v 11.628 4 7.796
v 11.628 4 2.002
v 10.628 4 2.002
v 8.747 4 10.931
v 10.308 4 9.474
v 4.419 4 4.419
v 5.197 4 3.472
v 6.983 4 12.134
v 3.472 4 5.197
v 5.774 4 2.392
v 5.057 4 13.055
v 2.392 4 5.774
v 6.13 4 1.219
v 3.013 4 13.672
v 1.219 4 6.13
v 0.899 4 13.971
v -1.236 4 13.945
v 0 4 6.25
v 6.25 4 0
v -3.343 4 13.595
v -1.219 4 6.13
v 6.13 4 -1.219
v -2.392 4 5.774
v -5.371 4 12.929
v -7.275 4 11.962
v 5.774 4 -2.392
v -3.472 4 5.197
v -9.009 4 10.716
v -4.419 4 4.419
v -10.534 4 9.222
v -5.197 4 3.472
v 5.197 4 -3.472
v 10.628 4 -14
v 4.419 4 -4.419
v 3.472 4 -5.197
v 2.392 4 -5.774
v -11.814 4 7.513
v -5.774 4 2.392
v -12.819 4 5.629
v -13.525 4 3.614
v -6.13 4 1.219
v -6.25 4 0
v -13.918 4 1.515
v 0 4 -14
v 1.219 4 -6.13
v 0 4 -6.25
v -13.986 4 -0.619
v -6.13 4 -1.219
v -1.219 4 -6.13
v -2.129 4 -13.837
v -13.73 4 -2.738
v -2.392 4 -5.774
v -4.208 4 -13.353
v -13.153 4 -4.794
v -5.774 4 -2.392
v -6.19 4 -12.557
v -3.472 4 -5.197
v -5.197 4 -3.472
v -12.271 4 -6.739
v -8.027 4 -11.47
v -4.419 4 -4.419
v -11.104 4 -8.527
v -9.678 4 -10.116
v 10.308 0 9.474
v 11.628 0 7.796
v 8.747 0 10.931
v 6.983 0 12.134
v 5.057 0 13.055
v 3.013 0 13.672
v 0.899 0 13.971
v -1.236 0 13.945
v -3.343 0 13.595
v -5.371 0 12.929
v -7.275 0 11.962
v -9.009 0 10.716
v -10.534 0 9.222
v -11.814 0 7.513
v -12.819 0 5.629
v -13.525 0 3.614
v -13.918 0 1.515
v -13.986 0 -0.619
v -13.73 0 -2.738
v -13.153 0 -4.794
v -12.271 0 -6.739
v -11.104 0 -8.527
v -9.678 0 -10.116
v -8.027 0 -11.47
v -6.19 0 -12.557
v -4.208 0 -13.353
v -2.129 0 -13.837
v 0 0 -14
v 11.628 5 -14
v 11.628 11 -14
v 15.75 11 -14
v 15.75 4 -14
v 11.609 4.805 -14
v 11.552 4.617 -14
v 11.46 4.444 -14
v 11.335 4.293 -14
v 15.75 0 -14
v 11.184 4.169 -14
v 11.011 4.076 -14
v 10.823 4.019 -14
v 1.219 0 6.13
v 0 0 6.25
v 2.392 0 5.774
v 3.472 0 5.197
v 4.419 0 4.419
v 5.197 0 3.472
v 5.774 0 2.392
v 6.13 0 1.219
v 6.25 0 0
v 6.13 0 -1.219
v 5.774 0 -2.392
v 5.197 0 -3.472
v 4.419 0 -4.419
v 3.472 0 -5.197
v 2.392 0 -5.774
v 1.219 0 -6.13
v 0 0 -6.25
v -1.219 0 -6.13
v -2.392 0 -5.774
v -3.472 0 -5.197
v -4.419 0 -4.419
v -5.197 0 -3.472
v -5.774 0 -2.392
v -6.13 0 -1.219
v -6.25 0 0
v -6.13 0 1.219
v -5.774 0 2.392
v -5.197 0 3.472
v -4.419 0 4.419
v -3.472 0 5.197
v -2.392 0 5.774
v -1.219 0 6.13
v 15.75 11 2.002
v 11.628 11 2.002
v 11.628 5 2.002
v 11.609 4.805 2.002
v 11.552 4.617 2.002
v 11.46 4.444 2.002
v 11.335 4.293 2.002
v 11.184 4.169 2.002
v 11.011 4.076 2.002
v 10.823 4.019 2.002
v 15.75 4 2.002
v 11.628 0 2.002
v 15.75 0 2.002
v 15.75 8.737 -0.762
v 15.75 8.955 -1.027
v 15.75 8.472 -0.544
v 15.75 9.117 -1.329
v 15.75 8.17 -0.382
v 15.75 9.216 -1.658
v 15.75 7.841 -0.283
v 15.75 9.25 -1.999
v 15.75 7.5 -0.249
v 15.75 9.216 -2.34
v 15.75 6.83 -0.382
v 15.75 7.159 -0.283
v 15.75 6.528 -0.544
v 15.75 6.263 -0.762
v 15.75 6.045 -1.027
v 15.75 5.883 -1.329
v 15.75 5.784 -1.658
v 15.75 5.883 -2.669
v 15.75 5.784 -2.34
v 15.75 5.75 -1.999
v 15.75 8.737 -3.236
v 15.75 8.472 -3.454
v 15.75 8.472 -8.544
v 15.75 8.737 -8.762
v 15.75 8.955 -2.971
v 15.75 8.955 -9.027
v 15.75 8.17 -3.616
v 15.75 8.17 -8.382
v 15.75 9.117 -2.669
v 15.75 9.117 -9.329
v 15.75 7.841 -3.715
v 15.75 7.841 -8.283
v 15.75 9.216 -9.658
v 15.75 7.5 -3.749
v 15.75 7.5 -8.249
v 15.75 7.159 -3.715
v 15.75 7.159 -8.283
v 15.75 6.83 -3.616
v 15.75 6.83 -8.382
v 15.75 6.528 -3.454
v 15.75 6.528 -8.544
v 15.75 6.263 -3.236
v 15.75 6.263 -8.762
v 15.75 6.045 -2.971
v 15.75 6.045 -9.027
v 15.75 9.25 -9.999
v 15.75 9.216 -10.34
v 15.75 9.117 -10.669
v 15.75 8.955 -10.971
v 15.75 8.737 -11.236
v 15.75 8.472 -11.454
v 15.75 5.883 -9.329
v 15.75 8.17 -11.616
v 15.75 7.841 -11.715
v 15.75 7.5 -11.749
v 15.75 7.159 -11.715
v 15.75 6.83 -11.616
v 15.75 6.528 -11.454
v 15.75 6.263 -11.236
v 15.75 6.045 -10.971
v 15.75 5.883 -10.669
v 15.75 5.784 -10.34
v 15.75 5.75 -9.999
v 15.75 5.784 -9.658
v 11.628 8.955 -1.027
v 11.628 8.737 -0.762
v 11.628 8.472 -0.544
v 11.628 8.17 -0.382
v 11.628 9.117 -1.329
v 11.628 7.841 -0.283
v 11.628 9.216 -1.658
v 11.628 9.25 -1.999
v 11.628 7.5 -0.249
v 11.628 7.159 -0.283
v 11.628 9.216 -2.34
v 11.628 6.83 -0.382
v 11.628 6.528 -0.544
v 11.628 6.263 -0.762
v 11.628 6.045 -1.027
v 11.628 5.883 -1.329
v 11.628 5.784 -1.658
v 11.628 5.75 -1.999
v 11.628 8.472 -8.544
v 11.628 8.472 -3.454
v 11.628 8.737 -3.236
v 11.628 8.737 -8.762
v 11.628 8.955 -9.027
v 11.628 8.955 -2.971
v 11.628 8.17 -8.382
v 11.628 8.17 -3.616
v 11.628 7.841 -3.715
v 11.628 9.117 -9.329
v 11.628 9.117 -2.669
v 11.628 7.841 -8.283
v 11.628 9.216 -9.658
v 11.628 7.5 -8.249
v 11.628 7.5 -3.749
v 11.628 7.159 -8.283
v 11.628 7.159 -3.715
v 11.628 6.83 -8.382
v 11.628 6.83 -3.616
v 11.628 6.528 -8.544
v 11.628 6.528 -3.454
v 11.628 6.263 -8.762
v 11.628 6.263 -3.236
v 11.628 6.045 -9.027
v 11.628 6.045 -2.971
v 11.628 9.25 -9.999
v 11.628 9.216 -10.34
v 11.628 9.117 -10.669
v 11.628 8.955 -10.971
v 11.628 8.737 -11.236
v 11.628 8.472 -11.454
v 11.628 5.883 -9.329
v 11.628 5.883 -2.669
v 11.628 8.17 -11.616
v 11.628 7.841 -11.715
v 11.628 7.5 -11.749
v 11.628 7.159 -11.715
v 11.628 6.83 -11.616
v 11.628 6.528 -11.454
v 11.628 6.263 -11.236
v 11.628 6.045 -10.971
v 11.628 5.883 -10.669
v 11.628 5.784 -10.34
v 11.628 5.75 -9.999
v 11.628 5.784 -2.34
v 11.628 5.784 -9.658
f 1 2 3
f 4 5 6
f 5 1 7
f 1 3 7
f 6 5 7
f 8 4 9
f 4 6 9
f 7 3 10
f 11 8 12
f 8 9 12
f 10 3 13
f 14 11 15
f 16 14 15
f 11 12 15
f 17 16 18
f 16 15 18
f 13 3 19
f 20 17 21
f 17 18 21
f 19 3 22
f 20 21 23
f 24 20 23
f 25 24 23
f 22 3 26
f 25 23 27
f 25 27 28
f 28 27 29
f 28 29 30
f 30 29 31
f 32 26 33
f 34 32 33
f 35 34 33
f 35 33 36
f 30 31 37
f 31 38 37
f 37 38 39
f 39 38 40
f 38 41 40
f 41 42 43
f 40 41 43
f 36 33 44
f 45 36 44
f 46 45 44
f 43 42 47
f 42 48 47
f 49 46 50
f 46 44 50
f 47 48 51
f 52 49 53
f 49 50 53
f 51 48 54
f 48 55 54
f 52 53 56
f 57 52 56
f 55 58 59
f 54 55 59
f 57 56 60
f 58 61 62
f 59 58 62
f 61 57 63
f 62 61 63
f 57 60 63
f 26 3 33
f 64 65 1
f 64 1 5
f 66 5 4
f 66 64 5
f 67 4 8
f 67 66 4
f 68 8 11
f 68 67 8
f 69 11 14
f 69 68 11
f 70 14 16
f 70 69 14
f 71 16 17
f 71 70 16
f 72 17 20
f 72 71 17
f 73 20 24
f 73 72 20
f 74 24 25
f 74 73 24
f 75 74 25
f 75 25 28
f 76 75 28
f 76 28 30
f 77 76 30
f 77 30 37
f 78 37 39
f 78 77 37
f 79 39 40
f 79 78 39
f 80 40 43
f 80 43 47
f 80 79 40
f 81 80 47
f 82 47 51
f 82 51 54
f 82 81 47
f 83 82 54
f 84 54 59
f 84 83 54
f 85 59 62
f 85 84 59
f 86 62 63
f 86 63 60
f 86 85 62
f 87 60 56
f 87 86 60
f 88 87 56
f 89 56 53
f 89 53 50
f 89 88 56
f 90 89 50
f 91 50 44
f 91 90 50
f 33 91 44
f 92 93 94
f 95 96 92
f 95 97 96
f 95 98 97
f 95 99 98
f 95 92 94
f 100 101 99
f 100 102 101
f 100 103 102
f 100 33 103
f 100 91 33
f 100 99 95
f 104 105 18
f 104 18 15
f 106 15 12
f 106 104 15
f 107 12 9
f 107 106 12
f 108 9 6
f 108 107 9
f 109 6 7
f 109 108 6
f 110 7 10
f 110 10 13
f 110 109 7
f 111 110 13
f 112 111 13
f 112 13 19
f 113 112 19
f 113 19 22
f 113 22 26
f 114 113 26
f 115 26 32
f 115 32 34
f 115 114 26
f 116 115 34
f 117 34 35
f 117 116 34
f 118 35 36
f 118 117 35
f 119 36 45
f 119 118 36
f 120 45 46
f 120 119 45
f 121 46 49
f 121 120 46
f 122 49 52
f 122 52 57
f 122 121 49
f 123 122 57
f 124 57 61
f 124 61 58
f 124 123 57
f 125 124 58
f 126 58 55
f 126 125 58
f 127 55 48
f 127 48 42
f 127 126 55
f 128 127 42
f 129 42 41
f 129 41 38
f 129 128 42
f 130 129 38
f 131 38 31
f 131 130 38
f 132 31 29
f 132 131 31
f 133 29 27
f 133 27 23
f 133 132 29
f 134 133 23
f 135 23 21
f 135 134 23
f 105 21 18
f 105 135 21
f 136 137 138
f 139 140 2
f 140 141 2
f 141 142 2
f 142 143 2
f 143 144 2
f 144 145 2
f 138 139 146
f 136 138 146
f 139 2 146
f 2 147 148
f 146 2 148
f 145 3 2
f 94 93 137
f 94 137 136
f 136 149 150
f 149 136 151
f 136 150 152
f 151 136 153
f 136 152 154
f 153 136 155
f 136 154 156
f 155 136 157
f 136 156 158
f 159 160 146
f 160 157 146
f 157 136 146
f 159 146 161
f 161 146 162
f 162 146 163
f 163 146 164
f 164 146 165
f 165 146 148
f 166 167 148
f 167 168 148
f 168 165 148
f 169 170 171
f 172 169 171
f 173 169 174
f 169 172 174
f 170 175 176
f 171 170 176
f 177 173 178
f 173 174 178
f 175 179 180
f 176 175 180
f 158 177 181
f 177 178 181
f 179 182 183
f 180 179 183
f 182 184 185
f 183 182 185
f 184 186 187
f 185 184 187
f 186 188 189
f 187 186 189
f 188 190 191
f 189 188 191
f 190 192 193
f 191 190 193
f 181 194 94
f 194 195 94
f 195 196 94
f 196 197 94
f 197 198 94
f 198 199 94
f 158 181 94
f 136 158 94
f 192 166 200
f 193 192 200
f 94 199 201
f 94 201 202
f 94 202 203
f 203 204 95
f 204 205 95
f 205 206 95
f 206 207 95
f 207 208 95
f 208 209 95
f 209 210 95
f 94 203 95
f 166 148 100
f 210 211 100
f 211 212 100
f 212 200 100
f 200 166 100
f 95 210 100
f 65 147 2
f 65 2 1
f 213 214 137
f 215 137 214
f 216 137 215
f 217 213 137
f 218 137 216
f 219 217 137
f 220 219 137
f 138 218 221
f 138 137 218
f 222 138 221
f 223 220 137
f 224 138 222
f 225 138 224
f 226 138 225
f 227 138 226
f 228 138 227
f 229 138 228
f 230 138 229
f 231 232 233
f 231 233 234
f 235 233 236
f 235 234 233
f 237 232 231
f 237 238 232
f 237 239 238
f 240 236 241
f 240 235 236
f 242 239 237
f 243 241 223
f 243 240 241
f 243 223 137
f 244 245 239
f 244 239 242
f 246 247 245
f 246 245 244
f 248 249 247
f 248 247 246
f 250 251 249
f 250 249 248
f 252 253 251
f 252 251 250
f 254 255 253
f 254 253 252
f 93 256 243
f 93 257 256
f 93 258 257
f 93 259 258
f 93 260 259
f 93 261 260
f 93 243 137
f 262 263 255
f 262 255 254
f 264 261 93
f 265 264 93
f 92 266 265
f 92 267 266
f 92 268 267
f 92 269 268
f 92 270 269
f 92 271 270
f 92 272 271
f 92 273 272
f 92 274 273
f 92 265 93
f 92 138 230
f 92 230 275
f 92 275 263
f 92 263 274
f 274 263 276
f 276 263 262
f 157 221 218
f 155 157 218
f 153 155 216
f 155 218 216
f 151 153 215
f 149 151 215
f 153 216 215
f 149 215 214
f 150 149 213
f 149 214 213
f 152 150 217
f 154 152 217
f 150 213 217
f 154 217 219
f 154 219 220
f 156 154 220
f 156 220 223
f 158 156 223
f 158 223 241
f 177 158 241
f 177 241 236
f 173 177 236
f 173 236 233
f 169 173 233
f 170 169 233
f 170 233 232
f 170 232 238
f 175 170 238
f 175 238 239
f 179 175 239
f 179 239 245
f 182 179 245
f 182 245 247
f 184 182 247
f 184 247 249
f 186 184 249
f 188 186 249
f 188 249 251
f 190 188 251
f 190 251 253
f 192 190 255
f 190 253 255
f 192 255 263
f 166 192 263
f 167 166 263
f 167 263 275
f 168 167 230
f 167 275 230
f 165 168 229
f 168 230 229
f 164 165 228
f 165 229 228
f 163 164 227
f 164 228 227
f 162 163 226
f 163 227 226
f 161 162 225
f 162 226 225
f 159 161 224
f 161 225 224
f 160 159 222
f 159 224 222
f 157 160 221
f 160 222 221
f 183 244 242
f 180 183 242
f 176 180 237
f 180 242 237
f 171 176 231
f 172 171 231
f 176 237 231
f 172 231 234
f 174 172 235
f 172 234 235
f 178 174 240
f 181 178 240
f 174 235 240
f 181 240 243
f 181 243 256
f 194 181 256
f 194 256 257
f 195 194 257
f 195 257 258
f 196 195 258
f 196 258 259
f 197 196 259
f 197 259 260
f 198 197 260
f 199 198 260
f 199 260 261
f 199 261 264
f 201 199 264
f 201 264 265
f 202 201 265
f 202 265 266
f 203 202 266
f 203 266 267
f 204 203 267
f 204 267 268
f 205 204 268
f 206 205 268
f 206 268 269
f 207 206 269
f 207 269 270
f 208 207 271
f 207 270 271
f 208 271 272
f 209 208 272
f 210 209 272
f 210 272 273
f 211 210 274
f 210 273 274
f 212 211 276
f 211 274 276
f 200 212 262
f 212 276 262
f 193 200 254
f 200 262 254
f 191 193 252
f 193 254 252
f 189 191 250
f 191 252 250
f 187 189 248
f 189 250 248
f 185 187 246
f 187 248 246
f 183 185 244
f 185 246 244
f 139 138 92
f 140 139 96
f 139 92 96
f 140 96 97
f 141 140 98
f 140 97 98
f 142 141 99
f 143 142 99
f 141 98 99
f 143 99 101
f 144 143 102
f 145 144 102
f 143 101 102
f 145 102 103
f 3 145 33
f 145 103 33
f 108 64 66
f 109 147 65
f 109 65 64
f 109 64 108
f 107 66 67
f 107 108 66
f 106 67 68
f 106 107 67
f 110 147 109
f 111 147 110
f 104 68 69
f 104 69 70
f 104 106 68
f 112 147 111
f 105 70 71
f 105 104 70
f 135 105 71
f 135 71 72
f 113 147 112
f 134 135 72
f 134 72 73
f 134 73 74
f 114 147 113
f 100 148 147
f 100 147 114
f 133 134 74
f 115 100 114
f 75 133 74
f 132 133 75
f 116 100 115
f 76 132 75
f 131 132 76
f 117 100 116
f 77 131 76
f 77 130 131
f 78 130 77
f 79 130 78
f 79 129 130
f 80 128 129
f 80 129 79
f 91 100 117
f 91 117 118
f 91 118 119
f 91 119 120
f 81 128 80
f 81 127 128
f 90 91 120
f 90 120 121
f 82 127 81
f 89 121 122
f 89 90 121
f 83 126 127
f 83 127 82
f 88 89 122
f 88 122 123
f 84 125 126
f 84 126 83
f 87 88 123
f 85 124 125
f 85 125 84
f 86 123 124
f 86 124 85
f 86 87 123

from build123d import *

# Parameters (mm, degrees)
SKETCH1_R           = 6.25
BOSS_EXTRUDE1_DEPTH = 4
SKETCH2_W           = 4.12162106
SKETCH2_H           = 16.002035265
BOSS_EXTRUDE2_DEPTH = 7
SKETCH3_R           = 1.75
CUT_EXTRUDE1_DEPTH  = 32.205988509
FILLET2_R           = 1


with BuildPart() as part:
    # Sketch1 → Boss-Extrude1 (new body)
    with BuildSketch(Plane(origin=(0, 0, 0), x_dir=(1, 0, 0), z_dir=(0, 1, 0))):
        with BuildLine():
            Line((0, 14), (15.749998278, 14))
            Line((15.749998278, 14), (15.749998278, -2.002035265))
            Line((15.749998278, -2.002035265), (11.628377218, -2.002035265))
            Line((11.628377218, -2.002035265), (11.628377218, -7.79620698))
            ThreePointArc((11.628377218, -7.79620698), (-12.352062535, -6.589882483), (0, 14))
        make_face()
        with Locations(Location((0, 0, 0), (0, 0, 270))):
            Circle(SKETCH1_R, mode=Mode.SUBTRACT)
    extrude(amount=BOSS_EXTRUDE1_DEPTH)

    # Sketch2 → Boss-Extrude2 (add)
    with BuildSketch(Plane(origin=(0, 4, 0), x_dir=(1, 0, 0), z_dir=(0, 1, 0))):
        with Locations((13.689187748, 5.998982368)):
            Rectangle(SKETCH2_W, SKETCH2_H)
    extrude(amount=BOSS_EXTRUDE2_DEPTH)

    # Sketch3 → Cut-Extrude1 (cut, through all)
    with BuildSketch(Plane.ZY.offset(-11.628377218)):
        with Locations((-1.998982368, 7.5)):
            Circle(SKETCH3_R)
        with Locations((-9.998982368, 7.5)):
            Circle(SKETCH3_R)
    extrude(amount=-CUT_EXTRUDE1_DEPTH, mode=Mode.SUBTRACT)

    # Fillet2
    fillet2_edges = [part.edges().sort_by_distance(p)[0] for p in [
        (11.628377218, 4, -5.998982368),
    ]]
    fillet(fillet2_edges, radius=FILLET2_R)


solid = part.part
